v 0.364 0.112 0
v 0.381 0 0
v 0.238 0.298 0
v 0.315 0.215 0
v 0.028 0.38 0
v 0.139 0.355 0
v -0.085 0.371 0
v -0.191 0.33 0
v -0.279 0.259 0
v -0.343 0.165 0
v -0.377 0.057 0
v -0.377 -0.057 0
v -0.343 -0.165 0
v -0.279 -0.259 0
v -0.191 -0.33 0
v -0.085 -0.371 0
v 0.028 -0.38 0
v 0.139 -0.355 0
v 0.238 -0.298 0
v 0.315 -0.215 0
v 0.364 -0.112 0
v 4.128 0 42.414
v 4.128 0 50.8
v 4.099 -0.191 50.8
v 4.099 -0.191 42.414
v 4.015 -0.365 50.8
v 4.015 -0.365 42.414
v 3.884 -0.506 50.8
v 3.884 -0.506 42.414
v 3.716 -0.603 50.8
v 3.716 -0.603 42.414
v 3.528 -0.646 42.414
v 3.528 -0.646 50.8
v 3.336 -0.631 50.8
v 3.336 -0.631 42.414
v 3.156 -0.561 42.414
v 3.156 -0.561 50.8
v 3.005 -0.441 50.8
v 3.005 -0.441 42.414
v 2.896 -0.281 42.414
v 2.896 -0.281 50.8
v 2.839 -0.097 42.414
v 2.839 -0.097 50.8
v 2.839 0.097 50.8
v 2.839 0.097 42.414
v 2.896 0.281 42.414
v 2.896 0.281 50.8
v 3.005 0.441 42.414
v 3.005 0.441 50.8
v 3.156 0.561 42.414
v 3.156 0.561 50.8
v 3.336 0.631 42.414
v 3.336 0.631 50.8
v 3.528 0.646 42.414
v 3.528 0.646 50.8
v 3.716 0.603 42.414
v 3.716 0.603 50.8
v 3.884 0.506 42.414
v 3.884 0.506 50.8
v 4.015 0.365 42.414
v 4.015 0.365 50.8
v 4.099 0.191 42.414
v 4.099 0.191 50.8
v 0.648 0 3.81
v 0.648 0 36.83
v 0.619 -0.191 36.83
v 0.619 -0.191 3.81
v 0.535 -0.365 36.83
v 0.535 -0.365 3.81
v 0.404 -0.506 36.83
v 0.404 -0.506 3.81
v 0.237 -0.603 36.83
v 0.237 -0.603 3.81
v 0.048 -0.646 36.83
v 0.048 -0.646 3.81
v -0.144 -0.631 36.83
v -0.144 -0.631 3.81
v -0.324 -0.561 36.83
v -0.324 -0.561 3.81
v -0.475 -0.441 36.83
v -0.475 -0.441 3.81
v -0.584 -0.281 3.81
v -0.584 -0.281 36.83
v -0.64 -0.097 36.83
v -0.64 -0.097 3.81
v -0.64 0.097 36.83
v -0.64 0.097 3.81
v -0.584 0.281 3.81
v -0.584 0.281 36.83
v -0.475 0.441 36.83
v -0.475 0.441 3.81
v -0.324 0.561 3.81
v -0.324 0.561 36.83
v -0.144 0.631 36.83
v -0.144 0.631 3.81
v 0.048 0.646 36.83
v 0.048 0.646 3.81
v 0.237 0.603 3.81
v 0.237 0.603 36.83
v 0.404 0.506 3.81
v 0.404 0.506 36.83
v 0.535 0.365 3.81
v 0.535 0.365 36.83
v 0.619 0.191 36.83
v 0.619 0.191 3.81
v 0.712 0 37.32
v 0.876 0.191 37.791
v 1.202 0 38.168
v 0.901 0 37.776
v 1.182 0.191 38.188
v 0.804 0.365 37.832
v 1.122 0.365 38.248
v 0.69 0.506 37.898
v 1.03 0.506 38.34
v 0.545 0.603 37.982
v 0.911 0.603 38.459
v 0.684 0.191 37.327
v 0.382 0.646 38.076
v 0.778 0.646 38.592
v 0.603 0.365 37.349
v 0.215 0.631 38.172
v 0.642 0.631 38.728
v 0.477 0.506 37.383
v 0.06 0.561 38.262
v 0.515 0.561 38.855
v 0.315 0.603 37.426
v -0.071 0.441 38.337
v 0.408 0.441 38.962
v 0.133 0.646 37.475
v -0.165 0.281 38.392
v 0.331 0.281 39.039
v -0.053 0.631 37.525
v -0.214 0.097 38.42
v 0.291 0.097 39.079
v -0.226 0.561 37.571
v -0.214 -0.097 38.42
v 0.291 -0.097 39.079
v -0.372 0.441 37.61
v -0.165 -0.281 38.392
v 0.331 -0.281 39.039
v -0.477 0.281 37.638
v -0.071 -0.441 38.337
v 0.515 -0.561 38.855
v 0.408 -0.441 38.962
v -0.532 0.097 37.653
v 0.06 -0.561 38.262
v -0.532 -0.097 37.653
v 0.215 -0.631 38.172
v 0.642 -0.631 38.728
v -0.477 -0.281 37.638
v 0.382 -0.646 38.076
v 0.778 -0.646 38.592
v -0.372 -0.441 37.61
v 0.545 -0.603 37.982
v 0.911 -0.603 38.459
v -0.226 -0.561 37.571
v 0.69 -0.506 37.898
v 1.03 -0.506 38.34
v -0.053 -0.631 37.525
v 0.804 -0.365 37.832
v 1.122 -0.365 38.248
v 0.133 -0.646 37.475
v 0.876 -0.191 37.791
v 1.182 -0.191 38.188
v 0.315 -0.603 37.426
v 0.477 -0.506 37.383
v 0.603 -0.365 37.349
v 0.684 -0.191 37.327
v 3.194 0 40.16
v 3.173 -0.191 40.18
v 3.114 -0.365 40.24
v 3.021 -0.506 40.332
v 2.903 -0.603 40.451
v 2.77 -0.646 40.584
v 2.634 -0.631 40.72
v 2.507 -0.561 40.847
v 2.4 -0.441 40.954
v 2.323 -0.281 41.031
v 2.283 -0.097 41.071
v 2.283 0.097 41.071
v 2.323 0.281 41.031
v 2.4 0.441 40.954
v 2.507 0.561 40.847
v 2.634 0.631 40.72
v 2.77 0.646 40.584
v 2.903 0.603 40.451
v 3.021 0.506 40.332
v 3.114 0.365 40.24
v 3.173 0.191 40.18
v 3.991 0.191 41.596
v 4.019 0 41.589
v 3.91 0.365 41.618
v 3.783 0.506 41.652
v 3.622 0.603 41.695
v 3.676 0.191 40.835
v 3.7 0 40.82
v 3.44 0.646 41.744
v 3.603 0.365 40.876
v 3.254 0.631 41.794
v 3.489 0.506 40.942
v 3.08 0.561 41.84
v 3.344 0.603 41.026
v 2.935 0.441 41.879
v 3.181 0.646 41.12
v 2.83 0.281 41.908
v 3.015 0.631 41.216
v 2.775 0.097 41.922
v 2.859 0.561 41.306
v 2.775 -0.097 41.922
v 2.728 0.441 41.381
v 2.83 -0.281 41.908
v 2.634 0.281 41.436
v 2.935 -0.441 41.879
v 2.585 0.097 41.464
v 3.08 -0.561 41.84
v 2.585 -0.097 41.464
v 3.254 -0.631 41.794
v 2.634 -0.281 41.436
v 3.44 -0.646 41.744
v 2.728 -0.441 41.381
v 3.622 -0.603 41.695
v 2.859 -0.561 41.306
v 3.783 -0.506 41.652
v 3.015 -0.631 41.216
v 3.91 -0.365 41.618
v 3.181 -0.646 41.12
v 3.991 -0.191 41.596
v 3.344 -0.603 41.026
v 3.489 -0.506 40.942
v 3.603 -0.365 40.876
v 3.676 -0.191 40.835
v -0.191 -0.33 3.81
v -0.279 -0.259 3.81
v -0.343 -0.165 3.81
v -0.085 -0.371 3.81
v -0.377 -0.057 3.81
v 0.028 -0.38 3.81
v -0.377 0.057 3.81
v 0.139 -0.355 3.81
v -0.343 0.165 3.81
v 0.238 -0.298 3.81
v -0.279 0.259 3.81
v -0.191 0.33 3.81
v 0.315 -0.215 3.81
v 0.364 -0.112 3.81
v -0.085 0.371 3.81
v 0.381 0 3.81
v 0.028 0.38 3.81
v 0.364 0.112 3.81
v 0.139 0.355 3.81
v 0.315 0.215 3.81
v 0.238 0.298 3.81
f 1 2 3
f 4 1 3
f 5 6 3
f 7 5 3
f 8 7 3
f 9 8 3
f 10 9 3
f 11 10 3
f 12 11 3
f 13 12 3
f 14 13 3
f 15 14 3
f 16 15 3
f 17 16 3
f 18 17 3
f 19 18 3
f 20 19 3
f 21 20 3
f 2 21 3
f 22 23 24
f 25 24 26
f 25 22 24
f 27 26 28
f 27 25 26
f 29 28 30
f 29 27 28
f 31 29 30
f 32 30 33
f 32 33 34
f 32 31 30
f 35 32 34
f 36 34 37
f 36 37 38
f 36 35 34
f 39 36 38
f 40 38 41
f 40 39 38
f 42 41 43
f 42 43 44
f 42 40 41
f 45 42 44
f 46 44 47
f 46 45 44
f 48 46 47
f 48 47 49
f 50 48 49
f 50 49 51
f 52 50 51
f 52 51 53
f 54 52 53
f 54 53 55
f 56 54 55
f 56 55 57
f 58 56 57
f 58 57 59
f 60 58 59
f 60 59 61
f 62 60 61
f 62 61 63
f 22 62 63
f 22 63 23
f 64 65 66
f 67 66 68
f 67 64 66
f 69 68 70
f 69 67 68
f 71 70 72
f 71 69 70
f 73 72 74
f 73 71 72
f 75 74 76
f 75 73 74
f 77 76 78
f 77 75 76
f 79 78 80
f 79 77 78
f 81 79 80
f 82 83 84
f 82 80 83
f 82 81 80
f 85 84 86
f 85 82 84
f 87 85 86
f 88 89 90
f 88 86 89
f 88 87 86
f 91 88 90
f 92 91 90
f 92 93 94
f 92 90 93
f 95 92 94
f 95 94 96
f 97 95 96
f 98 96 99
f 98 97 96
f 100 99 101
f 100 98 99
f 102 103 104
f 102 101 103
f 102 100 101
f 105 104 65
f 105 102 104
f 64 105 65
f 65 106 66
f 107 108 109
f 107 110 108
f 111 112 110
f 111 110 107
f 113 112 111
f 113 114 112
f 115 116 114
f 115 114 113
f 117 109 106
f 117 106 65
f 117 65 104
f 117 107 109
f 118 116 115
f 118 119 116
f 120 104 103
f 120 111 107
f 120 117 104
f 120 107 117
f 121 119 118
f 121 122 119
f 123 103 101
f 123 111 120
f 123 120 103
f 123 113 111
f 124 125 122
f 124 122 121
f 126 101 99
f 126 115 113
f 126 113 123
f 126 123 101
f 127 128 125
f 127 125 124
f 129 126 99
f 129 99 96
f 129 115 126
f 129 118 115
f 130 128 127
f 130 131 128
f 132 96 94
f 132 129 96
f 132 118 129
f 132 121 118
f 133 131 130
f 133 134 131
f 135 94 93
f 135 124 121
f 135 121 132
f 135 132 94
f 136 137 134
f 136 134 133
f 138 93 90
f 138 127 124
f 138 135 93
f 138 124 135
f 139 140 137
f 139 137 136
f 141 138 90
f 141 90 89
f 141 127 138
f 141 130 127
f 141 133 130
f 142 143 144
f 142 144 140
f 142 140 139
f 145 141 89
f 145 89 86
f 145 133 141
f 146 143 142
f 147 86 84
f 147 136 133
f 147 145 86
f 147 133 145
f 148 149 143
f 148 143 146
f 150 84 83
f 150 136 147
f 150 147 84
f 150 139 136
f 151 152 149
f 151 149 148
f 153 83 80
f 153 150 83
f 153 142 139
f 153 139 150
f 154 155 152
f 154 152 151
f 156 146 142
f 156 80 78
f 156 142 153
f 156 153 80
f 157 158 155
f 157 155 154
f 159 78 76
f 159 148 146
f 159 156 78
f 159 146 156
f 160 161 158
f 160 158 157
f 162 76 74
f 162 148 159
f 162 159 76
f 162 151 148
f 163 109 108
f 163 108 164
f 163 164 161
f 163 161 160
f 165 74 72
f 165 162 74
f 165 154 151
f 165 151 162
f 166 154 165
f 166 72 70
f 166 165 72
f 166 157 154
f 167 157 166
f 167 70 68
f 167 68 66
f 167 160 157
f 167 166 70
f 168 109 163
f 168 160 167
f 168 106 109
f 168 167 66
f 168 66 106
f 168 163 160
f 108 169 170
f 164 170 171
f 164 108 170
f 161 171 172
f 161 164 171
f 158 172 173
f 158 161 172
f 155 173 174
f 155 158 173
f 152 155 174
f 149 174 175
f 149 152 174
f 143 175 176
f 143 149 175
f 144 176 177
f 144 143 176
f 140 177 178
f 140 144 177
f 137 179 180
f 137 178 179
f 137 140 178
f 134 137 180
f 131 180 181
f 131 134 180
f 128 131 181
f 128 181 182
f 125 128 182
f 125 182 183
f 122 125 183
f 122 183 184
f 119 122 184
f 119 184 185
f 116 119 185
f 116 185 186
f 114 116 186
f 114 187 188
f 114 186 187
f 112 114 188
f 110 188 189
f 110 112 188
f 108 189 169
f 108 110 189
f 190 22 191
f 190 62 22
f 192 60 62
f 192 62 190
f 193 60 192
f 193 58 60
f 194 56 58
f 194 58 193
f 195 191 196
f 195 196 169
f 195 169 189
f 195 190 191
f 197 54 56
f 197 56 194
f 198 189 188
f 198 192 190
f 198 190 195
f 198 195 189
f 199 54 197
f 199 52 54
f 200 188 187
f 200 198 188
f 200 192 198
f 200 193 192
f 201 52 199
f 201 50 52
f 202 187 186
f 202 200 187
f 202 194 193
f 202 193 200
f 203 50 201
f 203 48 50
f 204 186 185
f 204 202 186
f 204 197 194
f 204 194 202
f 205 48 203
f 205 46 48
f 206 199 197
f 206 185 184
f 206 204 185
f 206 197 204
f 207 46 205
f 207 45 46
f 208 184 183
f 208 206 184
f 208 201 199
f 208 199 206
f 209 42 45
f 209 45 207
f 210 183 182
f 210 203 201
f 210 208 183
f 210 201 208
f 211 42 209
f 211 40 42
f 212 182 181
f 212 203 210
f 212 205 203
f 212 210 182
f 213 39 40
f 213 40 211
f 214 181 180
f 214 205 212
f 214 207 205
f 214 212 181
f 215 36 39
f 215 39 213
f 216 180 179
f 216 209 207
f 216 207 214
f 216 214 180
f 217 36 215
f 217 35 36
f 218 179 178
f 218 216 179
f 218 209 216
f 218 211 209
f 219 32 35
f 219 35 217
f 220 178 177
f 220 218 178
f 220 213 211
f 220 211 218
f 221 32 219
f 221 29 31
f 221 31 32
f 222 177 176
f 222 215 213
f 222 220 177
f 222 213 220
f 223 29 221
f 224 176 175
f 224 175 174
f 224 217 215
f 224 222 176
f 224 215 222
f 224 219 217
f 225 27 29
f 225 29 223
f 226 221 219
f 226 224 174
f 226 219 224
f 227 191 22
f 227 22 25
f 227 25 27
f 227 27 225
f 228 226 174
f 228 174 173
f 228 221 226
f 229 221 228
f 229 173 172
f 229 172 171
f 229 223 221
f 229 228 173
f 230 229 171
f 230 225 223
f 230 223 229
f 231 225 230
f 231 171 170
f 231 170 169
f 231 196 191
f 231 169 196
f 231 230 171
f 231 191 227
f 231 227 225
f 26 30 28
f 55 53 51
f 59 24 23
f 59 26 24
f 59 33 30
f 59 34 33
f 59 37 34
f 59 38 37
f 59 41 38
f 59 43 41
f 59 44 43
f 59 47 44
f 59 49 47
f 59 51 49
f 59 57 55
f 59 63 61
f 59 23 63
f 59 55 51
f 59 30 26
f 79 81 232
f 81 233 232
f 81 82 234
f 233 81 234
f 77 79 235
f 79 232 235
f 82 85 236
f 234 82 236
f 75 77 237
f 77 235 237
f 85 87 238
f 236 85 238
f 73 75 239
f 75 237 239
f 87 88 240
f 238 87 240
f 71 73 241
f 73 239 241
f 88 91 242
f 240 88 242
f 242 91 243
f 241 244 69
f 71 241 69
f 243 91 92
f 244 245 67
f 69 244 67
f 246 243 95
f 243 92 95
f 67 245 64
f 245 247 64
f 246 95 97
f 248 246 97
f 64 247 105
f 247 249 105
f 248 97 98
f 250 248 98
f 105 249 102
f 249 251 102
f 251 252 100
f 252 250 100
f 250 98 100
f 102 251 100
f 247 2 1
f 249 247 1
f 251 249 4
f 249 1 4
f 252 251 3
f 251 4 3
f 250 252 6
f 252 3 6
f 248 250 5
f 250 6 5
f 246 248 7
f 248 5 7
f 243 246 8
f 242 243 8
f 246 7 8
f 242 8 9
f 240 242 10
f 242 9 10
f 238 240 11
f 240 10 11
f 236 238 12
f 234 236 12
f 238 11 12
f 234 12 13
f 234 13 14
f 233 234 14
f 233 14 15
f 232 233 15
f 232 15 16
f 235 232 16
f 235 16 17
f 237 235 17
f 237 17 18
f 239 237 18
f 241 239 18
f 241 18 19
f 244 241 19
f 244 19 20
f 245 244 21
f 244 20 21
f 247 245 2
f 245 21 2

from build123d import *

# Parameters (mm, degrees)
SKETCH1_R           = 0.6477
BOSS_EXTRUDE1_DEPTH = 35.56
SKETCH3_R           = 0.6477
SKETCH4_R           = 0.6477
SKETCH4_R_2         = 0.381
CUT_EXTRUDE2_DEPTH  = 3.81


with BuildPart() as part:
    # Sketch1 → Boss-Extrude1 (new body)
    with BuildSketch(Plane.XY):
        Circle(SKETCH1_R)
    extrude(amount=BOSS_EXTRUDE1_DEPTH)

    # Sweep1: sweep along a path in Sketch2
    with BuildLine(Plane(origin=(0, 0, 0), x_dir=(1, 0, 0), z_dir=(0, 1, 0))) as sweep1_path:
        Line((3.4798, -50.8), (3.4798, -42.414004897))
        ThreePointArc((3.4798, -42.414004897), (3.286454013, -41.441988979), (2.735851224, -40.617953673))
        Line((2.735851224, -40.617953673), (0.743948776, -38.626051224))
        ThreePointArc((0.743948776, -38.626051224), (0.193345987, -37.802015918), (0, -36.83))
        Line((0, -36.83), (0, -35.56))
    # Sketch3 → Sweep1 (sweep)
    with BuildSketch(Plane.XY.offset(35.56)):
        Circle(SKETCH3_R)
    sweep(path=sweep1_path.line)

    # Sketch4 → Cut-Extrude2 (cut)
    with BuildSketch(Plane.XY):
        Circle(SKETCH4_R)
        Circle(SKETCH4_R_2, mode=Mode.SUBTRACT)
    extrude(amount=CUT_EXTRUDE2_DEPTH, mode=Mode.SUBTRACT)


solid = part.part
